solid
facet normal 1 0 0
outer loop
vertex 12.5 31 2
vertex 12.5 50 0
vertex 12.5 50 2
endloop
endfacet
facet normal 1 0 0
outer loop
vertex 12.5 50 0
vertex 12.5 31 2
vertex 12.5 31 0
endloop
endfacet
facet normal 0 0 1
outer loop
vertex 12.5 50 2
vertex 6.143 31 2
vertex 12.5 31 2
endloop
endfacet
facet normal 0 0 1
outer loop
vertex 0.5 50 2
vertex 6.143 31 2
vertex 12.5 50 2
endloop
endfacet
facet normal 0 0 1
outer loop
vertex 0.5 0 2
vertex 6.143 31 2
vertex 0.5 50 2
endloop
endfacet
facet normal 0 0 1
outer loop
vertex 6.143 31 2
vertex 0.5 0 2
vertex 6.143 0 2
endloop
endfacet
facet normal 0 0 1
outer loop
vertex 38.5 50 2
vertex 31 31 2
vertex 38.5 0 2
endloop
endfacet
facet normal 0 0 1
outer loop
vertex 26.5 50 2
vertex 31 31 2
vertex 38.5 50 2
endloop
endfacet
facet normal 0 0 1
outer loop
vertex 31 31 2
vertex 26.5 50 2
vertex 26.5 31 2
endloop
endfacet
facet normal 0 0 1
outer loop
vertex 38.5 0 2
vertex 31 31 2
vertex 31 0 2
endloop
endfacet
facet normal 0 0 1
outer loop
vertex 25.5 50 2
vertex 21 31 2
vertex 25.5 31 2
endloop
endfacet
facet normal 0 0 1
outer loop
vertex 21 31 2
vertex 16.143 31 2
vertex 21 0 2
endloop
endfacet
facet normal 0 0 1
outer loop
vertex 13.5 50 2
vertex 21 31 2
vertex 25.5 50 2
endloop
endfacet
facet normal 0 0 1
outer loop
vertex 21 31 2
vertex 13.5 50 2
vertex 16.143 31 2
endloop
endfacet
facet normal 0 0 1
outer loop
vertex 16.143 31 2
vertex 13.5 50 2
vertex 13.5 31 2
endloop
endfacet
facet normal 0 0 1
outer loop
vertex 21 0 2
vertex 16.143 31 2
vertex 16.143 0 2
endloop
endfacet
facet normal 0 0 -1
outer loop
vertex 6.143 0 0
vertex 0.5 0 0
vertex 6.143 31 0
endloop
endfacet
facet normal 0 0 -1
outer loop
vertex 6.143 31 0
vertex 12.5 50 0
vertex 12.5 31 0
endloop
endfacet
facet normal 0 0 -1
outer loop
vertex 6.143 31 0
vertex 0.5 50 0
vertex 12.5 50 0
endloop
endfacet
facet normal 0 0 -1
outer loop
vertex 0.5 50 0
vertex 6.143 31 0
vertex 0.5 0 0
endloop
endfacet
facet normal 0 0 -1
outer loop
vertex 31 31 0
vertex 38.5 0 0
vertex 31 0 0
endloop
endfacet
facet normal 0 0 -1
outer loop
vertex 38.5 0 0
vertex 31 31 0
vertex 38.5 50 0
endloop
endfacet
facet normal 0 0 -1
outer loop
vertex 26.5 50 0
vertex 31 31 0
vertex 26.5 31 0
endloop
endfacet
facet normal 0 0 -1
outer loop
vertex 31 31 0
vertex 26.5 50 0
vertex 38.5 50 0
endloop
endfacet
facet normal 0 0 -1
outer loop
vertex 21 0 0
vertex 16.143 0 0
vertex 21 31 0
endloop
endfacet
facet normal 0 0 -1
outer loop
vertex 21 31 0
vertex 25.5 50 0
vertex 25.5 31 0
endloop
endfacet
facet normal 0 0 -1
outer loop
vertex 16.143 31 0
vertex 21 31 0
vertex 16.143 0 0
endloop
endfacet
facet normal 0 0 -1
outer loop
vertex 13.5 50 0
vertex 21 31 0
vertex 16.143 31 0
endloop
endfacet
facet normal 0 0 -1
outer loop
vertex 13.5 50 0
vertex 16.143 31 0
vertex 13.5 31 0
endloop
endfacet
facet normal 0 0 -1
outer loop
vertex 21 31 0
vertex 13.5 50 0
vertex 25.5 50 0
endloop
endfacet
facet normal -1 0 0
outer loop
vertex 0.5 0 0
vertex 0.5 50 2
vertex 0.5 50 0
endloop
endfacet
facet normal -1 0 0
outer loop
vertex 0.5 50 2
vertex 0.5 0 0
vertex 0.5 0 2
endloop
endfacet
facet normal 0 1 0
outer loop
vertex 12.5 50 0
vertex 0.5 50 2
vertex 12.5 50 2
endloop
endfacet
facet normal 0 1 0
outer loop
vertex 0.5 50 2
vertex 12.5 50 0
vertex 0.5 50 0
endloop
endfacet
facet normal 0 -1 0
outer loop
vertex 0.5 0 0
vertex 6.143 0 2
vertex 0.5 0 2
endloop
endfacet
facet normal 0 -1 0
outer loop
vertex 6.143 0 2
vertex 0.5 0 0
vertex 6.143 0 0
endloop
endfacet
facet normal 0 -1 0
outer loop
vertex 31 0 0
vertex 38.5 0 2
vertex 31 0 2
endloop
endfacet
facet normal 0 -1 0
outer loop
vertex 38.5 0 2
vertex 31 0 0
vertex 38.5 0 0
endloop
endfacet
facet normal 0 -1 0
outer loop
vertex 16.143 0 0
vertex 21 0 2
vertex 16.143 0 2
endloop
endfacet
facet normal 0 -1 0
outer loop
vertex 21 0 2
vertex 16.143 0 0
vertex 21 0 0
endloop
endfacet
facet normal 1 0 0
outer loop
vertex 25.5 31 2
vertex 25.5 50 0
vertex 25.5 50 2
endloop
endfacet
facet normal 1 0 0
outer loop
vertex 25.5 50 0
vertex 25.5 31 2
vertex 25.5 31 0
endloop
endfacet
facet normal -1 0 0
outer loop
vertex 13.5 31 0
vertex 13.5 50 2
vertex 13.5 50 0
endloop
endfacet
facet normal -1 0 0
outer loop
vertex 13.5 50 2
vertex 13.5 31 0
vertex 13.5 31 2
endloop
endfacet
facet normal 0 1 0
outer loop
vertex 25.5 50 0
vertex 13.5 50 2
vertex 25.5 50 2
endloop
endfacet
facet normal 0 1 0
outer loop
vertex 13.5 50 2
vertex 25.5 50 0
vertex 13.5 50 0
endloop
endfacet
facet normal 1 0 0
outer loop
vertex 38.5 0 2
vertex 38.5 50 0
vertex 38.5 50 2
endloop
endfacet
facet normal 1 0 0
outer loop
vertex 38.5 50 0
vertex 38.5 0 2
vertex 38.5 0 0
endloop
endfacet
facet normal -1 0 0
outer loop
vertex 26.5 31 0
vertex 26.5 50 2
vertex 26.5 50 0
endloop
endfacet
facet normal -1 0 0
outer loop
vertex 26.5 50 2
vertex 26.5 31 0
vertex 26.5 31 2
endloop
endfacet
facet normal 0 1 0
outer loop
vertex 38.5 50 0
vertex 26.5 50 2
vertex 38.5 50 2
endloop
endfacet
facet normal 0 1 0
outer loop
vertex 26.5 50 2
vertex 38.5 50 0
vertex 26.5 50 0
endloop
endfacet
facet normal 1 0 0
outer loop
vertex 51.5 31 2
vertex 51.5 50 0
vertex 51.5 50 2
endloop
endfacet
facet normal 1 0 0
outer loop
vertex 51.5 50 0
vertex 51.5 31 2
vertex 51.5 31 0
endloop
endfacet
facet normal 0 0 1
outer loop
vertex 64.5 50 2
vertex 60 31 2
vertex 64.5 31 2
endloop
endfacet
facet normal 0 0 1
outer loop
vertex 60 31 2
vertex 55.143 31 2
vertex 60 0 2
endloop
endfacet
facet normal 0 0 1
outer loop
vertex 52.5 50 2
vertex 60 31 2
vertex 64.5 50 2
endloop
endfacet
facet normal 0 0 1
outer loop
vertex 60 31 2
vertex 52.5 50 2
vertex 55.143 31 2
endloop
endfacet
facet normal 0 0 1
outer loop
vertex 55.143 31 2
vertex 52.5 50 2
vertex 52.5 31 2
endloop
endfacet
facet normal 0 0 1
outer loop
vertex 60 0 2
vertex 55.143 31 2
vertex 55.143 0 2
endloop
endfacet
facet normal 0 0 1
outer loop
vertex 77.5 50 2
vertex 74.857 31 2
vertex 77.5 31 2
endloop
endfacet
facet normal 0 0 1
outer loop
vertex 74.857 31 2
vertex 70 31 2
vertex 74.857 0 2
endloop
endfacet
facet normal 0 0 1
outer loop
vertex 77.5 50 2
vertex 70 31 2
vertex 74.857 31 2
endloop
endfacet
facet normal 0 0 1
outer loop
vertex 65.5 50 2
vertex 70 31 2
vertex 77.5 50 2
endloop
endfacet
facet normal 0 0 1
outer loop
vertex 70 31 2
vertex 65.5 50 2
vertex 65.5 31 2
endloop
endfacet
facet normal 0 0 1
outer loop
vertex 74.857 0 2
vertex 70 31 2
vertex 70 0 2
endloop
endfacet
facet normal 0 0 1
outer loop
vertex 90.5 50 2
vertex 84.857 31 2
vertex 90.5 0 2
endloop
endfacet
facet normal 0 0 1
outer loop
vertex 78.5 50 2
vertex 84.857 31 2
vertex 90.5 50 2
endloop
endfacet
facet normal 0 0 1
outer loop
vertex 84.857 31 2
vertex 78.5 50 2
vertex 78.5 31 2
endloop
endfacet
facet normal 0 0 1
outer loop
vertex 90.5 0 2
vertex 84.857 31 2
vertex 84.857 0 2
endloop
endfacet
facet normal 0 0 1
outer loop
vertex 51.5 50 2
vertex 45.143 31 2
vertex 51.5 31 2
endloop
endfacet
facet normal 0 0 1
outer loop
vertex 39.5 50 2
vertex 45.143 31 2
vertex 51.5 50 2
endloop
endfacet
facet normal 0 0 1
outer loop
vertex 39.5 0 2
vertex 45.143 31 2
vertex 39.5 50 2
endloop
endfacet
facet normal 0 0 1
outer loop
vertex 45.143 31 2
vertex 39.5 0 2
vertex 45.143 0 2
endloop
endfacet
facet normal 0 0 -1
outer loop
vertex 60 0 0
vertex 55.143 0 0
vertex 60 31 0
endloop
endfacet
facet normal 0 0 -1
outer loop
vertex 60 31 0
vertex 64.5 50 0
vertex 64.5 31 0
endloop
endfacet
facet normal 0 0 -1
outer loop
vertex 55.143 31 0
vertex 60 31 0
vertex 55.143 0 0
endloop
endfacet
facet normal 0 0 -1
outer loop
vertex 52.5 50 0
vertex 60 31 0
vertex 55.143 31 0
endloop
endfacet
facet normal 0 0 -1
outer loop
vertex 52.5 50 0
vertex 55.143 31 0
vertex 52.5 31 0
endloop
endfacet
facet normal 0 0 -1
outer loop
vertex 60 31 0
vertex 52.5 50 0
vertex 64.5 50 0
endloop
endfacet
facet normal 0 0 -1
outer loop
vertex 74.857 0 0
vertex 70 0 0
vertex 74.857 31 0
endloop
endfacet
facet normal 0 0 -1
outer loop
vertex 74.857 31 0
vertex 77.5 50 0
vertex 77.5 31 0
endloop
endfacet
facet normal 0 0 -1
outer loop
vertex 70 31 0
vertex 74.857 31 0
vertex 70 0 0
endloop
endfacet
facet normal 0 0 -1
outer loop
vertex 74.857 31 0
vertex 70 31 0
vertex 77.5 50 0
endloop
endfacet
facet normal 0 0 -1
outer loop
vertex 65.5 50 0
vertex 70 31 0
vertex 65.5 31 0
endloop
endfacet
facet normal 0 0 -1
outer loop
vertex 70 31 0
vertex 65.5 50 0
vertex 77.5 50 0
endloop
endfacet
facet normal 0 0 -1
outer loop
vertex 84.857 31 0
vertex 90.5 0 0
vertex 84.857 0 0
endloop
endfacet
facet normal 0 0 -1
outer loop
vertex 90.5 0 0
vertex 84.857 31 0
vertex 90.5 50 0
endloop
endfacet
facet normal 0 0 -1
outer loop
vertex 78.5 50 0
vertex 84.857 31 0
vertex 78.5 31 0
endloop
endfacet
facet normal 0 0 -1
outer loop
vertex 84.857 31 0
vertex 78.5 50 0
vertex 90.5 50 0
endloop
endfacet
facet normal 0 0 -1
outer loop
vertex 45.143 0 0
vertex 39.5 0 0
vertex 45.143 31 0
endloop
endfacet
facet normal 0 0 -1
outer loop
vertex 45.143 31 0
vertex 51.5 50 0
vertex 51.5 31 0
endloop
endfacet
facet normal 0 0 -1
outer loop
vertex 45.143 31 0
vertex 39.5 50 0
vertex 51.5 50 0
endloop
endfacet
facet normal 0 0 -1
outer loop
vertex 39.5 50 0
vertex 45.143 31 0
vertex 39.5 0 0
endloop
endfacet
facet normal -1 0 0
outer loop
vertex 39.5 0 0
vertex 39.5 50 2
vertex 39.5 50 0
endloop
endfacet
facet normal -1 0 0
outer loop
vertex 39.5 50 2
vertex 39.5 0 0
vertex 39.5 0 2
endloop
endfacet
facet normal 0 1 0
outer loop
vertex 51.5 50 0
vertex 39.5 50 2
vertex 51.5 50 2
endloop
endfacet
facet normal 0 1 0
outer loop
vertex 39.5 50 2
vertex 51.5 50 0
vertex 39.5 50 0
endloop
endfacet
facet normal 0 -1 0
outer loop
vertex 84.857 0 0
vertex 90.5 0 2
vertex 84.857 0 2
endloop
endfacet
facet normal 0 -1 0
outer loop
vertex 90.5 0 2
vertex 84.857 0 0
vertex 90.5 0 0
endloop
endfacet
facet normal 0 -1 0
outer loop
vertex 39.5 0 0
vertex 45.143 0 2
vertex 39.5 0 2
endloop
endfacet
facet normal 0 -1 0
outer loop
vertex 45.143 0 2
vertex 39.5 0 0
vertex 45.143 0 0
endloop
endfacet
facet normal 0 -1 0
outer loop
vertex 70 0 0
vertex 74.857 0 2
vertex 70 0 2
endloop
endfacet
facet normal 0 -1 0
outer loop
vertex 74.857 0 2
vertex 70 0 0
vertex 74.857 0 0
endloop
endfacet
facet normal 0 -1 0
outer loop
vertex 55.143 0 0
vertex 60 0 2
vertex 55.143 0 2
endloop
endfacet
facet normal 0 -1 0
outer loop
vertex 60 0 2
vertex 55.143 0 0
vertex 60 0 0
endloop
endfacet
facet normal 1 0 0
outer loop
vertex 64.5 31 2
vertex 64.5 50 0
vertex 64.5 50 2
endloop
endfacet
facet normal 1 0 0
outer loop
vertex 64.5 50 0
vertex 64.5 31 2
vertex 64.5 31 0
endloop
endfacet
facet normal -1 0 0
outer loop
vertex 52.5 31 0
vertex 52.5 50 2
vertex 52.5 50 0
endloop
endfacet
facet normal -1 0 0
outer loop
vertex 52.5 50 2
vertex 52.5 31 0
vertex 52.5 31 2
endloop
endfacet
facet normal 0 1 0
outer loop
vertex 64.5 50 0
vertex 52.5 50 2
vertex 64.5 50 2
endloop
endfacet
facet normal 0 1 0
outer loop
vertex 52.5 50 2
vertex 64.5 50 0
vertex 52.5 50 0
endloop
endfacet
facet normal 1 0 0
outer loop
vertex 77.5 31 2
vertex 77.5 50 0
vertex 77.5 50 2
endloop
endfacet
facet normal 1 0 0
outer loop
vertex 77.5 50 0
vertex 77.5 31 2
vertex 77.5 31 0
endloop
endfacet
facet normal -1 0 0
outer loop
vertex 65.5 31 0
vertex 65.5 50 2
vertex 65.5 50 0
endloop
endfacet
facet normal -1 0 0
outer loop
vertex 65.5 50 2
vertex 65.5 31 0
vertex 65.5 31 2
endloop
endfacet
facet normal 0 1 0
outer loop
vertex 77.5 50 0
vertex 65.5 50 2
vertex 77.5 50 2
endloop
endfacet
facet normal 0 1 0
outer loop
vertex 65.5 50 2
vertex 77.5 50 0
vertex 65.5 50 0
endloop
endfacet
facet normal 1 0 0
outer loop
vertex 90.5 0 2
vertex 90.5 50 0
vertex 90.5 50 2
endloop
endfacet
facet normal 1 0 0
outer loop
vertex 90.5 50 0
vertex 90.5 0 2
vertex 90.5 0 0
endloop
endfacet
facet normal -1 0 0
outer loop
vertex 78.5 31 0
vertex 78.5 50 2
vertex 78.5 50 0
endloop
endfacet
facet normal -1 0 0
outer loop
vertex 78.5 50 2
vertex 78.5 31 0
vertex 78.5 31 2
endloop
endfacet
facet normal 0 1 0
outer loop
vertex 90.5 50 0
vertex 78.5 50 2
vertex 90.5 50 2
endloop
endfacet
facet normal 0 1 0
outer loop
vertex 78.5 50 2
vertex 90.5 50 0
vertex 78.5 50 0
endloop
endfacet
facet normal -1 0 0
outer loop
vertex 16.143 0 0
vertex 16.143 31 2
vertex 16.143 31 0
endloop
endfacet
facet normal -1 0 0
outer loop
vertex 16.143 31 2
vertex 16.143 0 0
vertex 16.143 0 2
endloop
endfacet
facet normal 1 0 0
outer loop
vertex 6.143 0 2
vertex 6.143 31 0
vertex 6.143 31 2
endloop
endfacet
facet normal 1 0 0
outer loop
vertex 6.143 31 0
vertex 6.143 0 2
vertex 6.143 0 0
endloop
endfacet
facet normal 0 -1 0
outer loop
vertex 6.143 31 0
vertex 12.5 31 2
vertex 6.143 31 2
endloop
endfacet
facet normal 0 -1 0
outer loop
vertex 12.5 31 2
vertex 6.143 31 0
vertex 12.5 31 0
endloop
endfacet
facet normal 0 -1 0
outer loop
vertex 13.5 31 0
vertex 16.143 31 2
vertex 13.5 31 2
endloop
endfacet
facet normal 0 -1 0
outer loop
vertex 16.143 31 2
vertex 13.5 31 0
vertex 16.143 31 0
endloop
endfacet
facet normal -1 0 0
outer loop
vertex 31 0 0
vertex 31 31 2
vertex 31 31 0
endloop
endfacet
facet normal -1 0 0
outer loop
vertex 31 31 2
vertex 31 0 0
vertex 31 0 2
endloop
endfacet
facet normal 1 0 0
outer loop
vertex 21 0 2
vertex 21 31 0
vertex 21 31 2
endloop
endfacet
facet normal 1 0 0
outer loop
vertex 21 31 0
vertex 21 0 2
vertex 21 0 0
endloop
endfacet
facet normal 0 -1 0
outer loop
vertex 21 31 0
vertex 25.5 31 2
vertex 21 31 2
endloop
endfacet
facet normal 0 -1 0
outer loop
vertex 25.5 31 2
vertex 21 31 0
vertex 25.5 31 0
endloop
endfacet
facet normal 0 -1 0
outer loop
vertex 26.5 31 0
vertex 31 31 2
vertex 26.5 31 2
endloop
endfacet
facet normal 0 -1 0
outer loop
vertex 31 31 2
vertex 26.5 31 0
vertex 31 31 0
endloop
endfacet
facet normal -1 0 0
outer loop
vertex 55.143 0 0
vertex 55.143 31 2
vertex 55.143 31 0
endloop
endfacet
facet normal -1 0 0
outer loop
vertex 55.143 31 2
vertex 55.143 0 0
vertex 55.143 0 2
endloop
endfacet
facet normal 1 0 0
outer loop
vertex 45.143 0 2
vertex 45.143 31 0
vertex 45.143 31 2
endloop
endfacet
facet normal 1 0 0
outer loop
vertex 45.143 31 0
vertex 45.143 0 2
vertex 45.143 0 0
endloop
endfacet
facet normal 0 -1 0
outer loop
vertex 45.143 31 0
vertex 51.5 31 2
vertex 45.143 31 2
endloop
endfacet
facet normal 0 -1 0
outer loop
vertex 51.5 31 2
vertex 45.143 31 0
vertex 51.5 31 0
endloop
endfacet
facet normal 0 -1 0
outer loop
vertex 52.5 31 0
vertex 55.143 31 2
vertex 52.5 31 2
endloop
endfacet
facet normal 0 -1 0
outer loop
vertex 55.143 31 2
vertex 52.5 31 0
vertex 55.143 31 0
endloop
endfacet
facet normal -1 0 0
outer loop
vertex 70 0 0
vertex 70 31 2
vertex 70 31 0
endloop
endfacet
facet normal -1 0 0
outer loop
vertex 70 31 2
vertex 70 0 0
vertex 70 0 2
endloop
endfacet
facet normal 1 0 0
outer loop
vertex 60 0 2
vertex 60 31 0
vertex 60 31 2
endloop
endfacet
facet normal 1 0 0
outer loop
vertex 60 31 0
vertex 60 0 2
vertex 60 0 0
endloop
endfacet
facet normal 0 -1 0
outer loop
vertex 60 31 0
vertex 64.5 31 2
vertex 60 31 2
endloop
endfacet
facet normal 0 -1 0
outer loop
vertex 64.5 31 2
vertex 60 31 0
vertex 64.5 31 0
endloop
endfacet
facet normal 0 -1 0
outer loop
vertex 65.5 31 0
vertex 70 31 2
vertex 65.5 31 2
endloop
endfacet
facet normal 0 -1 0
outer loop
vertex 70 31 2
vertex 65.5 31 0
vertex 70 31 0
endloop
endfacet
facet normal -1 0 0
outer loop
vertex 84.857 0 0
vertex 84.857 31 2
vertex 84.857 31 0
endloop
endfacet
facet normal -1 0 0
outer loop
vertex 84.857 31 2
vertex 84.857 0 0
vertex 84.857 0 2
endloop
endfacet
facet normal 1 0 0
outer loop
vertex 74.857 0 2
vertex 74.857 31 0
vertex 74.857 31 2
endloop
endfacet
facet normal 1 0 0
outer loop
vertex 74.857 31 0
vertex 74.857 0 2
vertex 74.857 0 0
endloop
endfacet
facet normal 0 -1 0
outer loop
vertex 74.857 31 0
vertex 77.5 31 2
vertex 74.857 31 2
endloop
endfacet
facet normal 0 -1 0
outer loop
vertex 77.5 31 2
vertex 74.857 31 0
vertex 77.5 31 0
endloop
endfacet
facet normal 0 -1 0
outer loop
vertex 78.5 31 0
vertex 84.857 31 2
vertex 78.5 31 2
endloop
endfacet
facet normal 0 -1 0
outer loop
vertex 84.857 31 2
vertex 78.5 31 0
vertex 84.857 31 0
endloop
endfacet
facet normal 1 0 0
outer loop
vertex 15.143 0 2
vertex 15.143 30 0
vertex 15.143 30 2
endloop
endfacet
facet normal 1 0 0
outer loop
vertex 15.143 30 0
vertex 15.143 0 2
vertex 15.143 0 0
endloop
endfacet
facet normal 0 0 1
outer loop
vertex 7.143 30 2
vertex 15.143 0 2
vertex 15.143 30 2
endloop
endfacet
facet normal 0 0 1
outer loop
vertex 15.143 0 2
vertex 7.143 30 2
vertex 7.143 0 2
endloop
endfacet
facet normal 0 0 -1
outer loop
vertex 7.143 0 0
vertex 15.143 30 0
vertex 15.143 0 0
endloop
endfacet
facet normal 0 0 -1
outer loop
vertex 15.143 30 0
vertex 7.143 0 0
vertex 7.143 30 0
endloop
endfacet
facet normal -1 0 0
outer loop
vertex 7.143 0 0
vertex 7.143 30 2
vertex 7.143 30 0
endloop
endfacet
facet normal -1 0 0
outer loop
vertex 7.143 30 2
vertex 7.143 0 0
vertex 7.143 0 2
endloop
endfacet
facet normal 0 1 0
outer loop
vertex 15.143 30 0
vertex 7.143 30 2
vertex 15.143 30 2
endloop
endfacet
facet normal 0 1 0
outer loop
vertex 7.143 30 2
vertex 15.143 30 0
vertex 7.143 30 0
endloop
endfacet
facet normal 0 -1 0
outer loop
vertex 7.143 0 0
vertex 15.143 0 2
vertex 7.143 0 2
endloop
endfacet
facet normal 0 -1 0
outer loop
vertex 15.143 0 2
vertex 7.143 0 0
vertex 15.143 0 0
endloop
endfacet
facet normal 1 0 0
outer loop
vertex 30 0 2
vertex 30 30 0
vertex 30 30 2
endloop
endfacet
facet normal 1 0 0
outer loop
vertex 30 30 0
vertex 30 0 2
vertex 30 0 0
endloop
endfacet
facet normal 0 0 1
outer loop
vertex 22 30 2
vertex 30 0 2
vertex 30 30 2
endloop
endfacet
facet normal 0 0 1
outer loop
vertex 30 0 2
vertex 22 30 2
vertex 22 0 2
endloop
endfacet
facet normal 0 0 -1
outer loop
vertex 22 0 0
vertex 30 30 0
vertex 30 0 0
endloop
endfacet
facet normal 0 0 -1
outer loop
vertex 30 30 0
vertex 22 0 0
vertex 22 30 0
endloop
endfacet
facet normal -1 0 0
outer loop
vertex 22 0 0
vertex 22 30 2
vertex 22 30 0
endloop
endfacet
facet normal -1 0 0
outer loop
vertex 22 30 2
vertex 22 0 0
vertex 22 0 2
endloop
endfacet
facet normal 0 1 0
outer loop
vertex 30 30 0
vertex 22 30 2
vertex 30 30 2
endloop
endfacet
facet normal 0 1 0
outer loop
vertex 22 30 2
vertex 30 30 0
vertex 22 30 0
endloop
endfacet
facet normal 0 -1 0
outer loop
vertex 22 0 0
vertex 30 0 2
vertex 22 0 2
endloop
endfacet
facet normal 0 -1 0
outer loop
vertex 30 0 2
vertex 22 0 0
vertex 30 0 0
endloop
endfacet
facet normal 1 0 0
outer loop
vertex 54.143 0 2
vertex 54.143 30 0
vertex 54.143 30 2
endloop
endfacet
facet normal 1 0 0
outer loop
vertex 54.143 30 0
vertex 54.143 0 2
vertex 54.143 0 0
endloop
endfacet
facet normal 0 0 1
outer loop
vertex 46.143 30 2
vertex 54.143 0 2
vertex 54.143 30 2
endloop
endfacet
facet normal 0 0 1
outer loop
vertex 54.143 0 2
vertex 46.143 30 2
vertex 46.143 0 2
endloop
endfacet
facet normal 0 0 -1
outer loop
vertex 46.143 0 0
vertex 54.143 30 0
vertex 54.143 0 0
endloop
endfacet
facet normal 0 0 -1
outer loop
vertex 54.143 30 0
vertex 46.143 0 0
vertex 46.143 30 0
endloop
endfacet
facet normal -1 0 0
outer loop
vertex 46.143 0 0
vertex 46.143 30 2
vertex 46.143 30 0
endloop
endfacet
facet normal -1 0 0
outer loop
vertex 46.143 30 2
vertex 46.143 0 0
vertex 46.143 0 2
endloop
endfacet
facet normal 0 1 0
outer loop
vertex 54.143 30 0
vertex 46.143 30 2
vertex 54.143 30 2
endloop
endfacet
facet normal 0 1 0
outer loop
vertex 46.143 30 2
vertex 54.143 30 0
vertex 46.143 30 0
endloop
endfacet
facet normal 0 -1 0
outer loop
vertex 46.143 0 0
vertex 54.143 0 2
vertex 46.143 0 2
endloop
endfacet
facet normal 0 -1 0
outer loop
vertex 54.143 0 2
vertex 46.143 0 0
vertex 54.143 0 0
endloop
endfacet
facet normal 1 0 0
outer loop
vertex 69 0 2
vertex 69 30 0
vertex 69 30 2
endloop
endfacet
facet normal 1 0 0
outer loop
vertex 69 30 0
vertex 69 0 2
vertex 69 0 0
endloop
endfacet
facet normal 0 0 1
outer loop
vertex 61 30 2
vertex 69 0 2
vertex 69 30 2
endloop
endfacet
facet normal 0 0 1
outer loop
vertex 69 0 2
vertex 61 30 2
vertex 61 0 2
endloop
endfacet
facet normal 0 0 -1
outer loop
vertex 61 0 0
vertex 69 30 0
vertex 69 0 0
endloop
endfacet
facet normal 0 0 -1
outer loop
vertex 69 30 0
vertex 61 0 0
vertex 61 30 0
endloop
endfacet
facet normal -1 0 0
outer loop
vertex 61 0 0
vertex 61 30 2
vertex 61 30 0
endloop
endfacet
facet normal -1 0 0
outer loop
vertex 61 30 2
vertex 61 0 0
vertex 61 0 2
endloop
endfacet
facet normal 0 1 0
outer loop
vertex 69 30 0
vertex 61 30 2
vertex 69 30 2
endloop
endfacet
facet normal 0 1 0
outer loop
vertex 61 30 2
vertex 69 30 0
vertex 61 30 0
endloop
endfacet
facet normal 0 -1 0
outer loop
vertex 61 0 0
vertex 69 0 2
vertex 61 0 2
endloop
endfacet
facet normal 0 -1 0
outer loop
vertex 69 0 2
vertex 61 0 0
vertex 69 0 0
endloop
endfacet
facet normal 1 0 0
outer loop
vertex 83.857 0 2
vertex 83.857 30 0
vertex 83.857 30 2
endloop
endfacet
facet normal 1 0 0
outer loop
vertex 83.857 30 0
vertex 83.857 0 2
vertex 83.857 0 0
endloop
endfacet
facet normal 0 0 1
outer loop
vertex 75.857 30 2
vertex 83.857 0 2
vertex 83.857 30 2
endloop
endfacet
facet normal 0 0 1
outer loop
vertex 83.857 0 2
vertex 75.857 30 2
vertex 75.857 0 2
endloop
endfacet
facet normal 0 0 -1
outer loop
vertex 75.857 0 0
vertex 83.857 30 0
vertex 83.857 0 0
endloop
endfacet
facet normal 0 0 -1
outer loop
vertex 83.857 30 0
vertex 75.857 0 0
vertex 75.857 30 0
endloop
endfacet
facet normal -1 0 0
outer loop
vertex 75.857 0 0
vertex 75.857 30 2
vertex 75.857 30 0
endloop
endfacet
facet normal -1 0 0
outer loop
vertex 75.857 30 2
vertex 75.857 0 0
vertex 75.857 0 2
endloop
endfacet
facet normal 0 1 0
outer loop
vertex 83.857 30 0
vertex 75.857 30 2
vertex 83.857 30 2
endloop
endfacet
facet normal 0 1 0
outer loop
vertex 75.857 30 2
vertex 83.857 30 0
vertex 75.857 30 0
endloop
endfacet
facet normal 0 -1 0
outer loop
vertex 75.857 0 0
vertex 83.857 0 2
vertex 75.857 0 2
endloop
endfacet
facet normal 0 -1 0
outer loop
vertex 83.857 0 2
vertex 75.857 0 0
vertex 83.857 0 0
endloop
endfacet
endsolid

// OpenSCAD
module white_key(ww, wl, bw, bl, mw, mb) {
    // ww/wl: white key width/length
    // bw/bl: black key width/length
    // mw/mb: margin between w&w / b&w keys
    
    difference() {
        for (i=[0:6]) {
            translate([i*(ww+mw)+0.5*mw, 0,0]) cube([ww, wl, 2]);
        }
        
        c = (ww+mb)*3/5;
        for (i=[1.5*c, 3.5*c]) {
            translate([i-bw/2-mb, 0,0]) cube([bw+2*mb, bl+mb, 2]);
        }
        
        c = (ww+mb)*4/7;
        for (i=[1.5*c, 3.5*c, 5.5*c]) {
            translate([(ww+mb)*3+i-bw/2-mb, 0,0]) cube([bw+2*mb, bl+mb, 2]);
        }
        
    }
    
}

module black_key(ww, wl, bw, bl, mw, mb) {
    // ww/wl: white key width/length
    // bw/bl: black key width/length
    // mw/mb: margin between w&w / b&w keys
        
    c = (ww+mb)*3/5;
    for (i=[1.5*c, 3.5*c]) {
        translate([i-bw/2, 0,0]) cube([bw, bl, 2]);
    }
    
    c = (ww+mb)*4/7;
    for (i=[1.5*c, 3.5*c, 5.5*c]) {
        translate([(ww+mb)*3+i-bw/2, 0,0]) cube([bw, bl, 2]);
    }
        

    
}

white_key(ww=12, wl=50, bw=8, bl=30, mw=1, mb=1);
black_key(ww=12, wl=50, bw=8, bl=30, mw=1, mb=1);
